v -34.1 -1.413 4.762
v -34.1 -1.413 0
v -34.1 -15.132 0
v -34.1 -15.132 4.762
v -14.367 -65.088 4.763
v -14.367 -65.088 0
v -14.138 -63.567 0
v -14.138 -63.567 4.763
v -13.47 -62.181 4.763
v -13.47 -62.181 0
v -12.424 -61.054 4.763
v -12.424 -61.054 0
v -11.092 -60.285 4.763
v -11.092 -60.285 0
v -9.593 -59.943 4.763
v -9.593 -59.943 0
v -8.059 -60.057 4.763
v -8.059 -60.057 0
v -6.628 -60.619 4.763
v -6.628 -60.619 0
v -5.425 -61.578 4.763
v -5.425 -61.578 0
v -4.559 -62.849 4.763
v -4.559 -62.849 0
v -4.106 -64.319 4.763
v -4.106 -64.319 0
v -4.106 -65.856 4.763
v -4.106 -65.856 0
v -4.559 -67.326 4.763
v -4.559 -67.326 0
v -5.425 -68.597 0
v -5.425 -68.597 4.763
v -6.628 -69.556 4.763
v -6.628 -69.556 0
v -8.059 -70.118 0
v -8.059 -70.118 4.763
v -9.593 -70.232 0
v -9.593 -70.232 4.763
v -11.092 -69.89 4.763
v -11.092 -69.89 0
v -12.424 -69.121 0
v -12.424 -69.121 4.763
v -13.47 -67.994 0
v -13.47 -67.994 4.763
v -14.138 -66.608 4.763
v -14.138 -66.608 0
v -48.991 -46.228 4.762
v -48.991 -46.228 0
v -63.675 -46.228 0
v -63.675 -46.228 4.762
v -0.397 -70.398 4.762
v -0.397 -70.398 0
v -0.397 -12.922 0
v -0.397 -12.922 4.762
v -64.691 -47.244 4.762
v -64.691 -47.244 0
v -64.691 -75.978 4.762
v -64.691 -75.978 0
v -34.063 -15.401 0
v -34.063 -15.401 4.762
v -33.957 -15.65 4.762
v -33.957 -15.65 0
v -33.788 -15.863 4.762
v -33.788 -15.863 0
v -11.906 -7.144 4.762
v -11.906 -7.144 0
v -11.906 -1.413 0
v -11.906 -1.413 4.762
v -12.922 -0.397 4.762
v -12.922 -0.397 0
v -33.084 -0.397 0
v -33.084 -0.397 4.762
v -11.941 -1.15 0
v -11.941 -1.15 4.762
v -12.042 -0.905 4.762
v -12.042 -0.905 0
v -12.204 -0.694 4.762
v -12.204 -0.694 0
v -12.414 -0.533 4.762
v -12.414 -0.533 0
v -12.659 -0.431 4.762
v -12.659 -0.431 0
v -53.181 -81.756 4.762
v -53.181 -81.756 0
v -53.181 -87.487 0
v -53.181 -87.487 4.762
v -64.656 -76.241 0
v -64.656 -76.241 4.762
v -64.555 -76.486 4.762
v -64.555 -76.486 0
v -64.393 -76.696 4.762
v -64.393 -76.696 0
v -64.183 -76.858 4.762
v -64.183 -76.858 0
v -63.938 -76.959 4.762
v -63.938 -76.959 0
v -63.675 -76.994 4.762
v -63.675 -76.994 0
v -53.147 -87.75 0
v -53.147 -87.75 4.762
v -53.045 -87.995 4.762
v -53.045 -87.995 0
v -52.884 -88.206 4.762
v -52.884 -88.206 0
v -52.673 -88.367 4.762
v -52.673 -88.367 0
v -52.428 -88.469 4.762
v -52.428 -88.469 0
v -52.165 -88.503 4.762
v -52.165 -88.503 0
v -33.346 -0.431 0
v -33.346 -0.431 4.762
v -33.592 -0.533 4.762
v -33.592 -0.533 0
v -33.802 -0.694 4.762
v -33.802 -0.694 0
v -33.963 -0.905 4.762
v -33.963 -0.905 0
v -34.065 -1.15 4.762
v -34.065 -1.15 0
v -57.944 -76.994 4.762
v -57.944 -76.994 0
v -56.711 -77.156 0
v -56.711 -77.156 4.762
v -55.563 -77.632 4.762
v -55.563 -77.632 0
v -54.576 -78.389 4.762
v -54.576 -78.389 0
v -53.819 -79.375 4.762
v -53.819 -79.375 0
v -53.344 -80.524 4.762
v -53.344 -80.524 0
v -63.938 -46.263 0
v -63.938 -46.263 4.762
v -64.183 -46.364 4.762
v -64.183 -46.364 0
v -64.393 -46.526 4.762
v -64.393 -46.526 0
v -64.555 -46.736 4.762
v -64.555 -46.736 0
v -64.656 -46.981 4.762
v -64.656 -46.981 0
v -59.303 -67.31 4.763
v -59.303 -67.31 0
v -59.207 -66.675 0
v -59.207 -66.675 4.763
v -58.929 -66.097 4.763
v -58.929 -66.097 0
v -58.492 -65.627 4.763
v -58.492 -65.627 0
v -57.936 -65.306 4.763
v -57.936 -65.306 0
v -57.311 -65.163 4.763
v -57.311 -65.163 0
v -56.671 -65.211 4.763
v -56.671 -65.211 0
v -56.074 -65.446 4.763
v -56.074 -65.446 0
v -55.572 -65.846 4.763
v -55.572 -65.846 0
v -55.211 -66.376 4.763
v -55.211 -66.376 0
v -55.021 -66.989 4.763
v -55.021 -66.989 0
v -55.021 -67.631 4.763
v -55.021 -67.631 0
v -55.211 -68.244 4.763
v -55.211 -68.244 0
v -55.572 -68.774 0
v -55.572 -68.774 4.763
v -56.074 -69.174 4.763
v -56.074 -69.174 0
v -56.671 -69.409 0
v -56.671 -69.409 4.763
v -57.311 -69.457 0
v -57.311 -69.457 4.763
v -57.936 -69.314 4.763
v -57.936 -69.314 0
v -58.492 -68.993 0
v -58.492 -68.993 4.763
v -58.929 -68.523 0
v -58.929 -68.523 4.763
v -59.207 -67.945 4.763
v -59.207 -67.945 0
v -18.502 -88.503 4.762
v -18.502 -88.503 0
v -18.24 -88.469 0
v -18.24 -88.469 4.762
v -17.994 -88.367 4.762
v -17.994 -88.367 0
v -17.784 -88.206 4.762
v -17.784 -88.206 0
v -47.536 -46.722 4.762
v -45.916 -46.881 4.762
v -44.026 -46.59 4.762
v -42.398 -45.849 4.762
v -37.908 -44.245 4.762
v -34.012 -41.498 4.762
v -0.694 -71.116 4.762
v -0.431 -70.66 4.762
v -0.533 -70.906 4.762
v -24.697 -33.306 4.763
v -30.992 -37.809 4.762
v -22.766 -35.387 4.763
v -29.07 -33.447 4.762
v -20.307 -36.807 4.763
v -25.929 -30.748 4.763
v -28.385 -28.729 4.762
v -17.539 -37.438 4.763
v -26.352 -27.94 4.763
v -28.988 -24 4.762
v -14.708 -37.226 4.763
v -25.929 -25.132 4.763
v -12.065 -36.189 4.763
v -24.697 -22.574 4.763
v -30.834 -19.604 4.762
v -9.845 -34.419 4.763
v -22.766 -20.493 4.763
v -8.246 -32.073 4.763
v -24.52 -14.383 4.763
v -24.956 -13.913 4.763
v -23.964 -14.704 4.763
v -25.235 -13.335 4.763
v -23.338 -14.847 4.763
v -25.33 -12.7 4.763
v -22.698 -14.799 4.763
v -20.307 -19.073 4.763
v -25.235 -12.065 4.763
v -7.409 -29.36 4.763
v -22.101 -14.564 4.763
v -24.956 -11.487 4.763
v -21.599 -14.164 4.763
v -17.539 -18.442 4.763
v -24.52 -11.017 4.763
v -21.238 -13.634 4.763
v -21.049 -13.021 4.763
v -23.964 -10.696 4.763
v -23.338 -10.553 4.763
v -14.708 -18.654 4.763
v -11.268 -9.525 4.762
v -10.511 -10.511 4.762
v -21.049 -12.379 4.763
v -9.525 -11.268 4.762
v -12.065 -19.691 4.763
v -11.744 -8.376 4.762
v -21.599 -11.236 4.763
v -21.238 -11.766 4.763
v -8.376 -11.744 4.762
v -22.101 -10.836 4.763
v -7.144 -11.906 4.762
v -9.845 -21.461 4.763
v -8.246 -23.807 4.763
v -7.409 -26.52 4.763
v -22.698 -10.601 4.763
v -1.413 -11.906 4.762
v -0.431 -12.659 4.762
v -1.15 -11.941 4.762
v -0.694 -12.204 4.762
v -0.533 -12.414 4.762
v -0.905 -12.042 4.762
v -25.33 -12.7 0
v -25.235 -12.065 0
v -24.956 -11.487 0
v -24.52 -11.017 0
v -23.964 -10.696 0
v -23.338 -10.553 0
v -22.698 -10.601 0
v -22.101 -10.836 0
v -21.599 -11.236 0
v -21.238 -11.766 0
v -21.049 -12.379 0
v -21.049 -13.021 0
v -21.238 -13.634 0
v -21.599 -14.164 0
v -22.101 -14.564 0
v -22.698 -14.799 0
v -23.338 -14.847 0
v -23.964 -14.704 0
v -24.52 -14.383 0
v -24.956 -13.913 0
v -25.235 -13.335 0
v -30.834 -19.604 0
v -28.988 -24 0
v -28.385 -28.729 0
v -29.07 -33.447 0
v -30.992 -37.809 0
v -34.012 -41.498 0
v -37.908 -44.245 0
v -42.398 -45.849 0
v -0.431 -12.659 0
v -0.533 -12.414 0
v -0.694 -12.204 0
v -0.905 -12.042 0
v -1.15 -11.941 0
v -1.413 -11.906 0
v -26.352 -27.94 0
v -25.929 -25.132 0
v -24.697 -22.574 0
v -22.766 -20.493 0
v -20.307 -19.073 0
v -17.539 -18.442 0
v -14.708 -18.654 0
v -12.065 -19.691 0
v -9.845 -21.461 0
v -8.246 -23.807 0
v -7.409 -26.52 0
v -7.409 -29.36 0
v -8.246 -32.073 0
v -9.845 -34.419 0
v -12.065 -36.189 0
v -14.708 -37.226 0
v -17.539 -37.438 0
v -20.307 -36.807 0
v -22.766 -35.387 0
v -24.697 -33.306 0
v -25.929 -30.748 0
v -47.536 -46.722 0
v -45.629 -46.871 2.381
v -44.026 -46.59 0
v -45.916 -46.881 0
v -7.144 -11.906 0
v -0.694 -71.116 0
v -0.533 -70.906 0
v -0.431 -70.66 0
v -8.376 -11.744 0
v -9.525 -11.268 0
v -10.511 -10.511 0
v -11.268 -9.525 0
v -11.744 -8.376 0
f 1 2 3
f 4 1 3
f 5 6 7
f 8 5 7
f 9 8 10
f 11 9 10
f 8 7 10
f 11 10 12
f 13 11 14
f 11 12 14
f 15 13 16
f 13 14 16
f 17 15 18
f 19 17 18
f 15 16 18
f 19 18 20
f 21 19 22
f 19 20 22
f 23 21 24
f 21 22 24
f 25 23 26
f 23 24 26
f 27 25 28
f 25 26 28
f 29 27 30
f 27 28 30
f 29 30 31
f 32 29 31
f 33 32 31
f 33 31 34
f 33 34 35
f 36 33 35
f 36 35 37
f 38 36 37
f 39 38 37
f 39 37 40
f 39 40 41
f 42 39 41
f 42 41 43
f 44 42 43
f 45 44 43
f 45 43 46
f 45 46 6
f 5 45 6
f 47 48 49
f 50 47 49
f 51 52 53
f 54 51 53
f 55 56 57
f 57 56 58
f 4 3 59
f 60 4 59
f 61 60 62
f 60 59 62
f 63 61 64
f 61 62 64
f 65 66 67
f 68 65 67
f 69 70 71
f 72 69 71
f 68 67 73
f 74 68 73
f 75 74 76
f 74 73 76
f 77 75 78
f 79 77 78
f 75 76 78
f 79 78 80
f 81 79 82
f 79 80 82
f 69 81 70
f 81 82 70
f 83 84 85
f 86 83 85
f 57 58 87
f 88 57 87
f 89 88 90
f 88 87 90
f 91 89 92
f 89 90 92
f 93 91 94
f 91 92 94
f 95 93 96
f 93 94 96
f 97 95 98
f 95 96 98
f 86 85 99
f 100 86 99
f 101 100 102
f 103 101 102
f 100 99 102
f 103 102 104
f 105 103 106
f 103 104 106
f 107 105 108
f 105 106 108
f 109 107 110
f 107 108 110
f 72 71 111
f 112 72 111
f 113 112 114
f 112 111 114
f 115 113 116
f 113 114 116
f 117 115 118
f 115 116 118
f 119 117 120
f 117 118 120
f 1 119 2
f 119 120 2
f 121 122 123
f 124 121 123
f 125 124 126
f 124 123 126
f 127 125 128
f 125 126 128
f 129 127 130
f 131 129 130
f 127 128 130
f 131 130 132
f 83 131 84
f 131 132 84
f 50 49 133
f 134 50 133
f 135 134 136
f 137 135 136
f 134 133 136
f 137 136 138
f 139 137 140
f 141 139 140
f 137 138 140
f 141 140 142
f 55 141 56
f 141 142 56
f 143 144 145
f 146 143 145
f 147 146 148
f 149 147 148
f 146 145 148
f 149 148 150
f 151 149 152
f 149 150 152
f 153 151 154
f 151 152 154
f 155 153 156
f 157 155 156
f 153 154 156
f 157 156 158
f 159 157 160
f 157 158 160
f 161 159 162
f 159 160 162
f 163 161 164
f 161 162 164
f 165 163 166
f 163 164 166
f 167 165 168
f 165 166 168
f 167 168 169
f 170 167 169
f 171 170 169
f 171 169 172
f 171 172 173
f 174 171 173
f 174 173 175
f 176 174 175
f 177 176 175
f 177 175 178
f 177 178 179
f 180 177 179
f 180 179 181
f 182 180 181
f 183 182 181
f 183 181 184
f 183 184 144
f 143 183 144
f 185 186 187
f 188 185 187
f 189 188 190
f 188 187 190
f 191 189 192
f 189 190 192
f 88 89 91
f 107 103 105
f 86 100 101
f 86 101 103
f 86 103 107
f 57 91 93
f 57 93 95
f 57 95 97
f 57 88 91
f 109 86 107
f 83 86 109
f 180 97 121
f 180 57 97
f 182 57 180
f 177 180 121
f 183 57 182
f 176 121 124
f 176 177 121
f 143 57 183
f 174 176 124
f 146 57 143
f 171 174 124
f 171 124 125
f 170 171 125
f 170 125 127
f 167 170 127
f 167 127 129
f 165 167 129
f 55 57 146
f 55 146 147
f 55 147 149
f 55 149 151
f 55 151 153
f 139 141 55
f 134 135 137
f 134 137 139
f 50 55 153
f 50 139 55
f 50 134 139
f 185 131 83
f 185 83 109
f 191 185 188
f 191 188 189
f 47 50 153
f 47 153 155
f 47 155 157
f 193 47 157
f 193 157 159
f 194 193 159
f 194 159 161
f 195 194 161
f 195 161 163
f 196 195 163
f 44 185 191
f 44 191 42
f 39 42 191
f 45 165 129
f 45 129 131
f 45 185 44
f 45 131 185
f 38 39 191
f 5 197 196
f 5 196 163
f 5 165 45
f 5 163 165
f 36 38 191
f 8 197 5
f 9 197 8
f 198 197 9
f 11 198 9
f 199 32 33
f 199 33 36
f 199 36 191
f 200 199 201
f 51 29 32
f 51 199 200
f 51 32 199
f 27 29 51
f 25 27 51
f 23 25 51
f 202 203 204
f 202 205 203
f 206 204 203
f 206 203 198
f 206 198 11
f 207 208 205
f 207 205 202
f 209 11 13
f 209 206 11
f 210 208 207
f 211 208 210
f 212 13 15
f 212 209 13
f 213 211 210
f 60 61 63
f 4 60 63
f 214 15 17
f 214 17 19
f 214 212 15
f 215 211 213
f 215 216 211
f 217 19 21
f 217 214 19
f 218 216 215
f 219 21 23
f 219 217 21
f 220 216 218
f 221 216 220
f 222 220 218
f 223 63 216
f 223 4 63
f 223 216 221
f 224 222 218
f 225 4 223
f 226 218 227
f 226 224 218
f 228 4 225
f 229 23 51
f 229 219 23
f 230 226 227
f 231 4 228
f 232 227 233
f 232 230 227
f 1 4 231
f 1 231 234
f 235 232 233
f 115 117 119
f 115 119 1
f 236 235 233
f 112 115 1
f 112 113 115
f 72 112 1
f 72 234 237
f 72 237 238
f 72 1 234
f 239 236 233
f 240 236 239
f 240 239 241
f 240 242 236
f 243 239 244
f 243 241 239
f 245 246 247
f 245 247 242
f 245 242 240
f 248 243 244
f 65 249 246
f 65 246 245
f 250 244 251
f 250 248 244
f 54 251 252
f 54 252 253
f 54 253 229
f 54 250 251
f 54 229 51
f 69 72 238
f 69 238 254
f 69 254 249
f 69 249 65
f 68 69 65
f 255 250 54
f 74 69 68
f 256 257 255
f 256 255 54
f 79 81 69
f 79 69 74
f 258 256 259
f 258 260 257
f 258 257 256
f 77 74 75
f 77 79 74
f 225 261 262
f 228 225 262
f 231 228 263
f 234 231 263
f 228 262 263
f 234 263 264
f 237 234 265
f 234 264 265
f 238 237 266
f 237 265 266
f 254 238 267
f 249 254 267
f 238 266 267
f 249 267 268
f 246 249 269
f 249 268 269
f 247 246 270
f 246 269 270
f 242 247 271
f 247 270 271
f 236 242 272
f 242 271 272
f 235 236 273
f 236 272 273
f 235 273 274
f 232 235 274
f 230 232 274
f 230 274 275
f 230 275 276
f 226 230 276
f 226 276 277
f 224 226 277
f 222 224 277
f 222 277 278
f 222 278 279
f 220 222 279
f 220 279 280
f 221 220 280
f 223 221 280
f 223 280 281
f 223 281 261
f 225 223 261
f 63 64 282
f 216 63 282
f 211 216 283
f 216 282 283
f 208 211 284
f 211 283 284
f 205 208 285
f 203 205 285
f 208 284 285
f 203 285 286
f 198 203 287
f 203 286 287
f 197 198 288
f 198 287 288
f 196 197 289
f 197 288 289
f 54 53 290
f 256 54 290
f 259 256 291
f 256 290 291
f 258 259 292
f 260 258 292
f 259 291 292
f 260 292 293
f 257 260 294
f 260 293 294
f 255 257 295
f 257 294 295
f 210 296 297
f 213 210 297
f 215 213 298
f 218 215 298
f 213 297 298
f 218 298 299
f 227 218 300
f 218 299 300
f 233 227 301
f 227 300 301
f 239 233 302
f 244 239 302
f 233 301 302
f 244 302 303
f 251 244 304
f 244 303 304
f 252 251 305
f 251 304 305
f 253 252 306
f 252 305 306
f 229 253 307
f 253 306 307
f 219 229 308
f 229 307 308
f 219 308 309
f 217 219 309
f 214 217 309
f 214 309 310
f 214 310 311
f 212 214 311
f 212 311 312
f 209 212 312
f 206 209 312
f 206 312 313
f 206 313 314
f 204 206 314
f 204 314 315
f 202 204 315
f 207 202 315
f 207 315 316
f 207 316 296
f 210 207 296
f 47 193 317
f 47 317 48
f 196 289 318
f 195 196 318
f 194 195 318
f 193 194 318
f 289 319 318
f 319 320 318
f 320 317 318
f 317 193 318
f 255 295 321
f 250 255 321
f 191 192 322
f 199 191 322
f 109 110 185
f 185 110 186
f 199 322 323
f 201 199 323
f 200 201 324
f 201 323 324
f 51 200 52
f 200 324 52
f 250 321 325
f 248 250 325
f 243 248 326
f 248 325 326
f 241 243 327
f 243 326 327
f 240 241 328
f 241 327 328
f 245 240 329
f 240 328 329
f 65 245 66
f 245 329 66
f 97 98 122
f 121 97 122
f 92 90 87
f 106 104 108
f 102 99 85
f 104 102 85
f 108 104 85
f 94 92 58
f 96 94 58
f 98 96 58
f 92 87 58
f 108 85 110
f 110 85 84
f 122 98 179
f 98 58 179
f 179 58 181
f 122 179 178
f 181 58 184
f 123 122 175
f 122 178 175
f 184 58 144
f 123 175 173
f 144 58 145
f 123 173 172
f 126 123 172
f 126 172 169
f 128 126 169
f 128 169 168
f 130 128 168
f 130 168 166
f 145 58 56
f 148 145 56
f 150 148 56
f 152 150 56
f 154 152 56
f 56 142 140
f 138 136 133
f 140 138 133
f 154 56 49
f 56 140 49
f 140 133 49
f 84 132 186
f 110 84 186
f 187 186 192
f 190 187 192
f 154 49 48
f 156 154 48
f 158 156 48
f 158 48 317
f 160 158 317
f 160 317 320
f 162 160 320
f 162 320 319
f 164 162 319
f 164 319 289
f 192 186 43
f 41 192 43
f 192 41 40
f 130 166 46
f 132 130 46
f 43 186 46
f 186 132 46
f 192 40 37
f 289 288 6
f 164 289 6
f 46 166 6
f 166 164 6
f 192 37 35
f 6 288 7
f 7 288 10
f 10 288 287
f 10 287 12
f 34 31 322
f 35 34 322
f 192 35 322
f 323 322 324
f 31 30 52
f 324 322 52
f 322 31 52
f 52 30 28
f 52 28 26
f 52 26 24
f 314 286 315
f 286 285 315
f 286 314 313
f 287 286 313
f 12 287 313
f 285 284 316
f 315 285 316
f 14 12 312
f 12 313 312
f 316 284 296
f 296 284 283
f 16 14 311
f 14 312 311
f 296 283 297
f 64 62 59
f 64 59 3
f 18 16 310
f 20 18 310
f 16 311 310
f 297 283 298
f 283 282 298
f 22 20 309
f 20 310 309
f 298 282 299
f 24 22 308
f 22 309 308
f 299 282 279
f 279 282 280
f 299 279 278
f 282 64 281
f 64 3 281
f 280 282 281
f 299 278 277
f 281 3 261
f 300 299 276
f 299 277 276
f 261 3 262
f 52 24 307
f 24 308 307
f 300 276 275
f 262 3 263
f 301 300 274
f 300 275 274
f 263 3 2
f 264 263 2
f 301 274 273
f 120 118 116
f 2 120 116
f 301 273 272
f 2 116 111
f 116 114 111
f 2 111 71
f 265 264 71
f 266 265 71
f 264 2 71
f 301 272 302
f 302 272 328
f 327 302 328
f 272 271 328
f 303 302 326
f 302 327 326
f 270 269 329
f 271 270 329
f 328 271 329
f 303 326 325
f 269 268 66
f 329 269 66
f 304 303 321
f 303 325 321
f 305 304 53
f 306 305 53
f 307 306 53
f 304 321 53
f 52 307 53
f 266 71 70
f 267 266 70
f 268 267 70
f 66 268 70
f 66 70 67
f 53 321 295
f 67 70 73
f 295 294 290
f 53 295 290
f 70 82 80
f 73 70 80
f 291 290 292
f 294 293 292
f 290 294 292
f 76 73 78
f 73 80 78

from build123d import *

# Parameters (mm, degrees)
BOSS_EXTRUDE1_DEPTH              = 4.7625
F_6_CLEARANCE_HOLE1_D            = 4.3053
F_3_4_0_75_DIAMETER_HOLE1_D      = 19.05
F_13_32_0_40625_DIAMETER_HOLE1_D = 10.31875


with BuildPart() as part:
    # Sketch1 → Boss-Extrude1 (new body)
    with BuildSketch(Plane.XY):
        with BuildLine():
            Line((-17.78404549, -88.20554549), (-0.69445451, -71.11595451))
            ThreePointArc((-0.69445451, -71.11595451), (-0.474213395, -70.786340388), (-0.396875, -70.397534021))
            Line((-0.396875, -70.397534021), (-0.396875, -12.92225))
            ThreePointArc((-0.396875, -12.92225), (-0.69445451, -12.20382951), (-1.412875, -11.90625))
            Line((-1.412875, -11.90625), (-7.14375, -11.90625))
            ThreePointArc((-7.14375, -11.90625), (-10.511346045, -10.511346045), (-11.90625, -7.14375))
            Line((-11.90625, -7.14375), (-11.90625, -1.412875))
            ThreePointArc((-11.90625, -1.412875), (-12.20382951, -0.69445451), (-12.92225, -0.396875))
            Line((-12.92225, -0.396875), (-33.0835, -0.396875))
            ThreePointArc((-33.0835, -0.396875), (-33.80192049, -0.69445451), (-34.0995, -1.412875))
            Line((-34.0995, -1.412875), (-34.0995, -15.131583582))
            ThreePointArc((-34.0995, -15.131583582), (-34.01851745, -15.529073666), (-33.788479592, -15.863198081))
            ThreePointArc((-33.788479592, -15.863198081), (-29.070029057, -33.446687471), (-42.397902867, -45.848729815))
            add(Edge.make_bspline(
                [(-42.397902867, -45.848729815), (-45.551783199, -47.860753205), (-48.991026243, -46.228)],
                knots=[-2.210610991, -2.210610991, -2.210610991, -1.065002144, -1.065002144, -1.065002144], degree=2, weights=[1, 0.84038431, 1]))
            Line((-48.991026243, -46.228), (-63.674625, -46.228))
            ThreePointArc((-63.674625, -46.228), (-64.39304549, -46.52557951), (-64.690625, -47.244))
            Line((-64.690625, -47.244), (-64.690625, -75.97775))
            ThreePointArc((-64.690625, -75.97775), (-64.39304549, -76.69617049), (-63.674625, -76.99375))
            Line((-63.674625, -76.99375), (-57.94375, -76.99375))
            ThreePointArc((-57.94375, -76.99375), (-54.576153955, -78.388653955), (-53.18125, -81.75625))
            Line((-53.18125, -81.75625), (-53.18125, -87.487125))
            ThreePointArc((-53.18125, -87.487125), (-52.88367049, -88.20554549), (-52.16525, -88.503125))
            Line((-52.16525, -88.503125), (-18.502465979, -88.503125))
            ThreePointArc((-18.502465979, -88.503125), (-18.113659612, -88.425786605), (-17.78404549, -88.20554549))
        make_face()
    extrude(amount=BOSS_EXTRUDE1_DEPTH)

    # #6 Clearance Hole1 (through all)
    with Locations(Plane.XY.offset(4.7625)):
        with Locations((-57.15, -67.31), (-23.1775, -12.7)):
            Hole(F_6_CLEARANCE_HOLE1_D / 2)

    # 3/4 (0.75) Diameter Hole1 (through all)
    with Locations(Plane.XY.offset(4.7625)):
        with Locations((-16.8275, -27.94)):
            Hole(F_3_4_0_75_DIAMETER_HOLE1_D / 2)

    # 13/32 (0.40625) Diameter Hole1 (through all)
    with Locations(Plane.XY.offset(4.7625)):
        with Locations((-9.2075, -65.0875)):
            Hole(F_13_32_0_40625_DIAMETER_HOLE1_D / 2)


solid = part.part
